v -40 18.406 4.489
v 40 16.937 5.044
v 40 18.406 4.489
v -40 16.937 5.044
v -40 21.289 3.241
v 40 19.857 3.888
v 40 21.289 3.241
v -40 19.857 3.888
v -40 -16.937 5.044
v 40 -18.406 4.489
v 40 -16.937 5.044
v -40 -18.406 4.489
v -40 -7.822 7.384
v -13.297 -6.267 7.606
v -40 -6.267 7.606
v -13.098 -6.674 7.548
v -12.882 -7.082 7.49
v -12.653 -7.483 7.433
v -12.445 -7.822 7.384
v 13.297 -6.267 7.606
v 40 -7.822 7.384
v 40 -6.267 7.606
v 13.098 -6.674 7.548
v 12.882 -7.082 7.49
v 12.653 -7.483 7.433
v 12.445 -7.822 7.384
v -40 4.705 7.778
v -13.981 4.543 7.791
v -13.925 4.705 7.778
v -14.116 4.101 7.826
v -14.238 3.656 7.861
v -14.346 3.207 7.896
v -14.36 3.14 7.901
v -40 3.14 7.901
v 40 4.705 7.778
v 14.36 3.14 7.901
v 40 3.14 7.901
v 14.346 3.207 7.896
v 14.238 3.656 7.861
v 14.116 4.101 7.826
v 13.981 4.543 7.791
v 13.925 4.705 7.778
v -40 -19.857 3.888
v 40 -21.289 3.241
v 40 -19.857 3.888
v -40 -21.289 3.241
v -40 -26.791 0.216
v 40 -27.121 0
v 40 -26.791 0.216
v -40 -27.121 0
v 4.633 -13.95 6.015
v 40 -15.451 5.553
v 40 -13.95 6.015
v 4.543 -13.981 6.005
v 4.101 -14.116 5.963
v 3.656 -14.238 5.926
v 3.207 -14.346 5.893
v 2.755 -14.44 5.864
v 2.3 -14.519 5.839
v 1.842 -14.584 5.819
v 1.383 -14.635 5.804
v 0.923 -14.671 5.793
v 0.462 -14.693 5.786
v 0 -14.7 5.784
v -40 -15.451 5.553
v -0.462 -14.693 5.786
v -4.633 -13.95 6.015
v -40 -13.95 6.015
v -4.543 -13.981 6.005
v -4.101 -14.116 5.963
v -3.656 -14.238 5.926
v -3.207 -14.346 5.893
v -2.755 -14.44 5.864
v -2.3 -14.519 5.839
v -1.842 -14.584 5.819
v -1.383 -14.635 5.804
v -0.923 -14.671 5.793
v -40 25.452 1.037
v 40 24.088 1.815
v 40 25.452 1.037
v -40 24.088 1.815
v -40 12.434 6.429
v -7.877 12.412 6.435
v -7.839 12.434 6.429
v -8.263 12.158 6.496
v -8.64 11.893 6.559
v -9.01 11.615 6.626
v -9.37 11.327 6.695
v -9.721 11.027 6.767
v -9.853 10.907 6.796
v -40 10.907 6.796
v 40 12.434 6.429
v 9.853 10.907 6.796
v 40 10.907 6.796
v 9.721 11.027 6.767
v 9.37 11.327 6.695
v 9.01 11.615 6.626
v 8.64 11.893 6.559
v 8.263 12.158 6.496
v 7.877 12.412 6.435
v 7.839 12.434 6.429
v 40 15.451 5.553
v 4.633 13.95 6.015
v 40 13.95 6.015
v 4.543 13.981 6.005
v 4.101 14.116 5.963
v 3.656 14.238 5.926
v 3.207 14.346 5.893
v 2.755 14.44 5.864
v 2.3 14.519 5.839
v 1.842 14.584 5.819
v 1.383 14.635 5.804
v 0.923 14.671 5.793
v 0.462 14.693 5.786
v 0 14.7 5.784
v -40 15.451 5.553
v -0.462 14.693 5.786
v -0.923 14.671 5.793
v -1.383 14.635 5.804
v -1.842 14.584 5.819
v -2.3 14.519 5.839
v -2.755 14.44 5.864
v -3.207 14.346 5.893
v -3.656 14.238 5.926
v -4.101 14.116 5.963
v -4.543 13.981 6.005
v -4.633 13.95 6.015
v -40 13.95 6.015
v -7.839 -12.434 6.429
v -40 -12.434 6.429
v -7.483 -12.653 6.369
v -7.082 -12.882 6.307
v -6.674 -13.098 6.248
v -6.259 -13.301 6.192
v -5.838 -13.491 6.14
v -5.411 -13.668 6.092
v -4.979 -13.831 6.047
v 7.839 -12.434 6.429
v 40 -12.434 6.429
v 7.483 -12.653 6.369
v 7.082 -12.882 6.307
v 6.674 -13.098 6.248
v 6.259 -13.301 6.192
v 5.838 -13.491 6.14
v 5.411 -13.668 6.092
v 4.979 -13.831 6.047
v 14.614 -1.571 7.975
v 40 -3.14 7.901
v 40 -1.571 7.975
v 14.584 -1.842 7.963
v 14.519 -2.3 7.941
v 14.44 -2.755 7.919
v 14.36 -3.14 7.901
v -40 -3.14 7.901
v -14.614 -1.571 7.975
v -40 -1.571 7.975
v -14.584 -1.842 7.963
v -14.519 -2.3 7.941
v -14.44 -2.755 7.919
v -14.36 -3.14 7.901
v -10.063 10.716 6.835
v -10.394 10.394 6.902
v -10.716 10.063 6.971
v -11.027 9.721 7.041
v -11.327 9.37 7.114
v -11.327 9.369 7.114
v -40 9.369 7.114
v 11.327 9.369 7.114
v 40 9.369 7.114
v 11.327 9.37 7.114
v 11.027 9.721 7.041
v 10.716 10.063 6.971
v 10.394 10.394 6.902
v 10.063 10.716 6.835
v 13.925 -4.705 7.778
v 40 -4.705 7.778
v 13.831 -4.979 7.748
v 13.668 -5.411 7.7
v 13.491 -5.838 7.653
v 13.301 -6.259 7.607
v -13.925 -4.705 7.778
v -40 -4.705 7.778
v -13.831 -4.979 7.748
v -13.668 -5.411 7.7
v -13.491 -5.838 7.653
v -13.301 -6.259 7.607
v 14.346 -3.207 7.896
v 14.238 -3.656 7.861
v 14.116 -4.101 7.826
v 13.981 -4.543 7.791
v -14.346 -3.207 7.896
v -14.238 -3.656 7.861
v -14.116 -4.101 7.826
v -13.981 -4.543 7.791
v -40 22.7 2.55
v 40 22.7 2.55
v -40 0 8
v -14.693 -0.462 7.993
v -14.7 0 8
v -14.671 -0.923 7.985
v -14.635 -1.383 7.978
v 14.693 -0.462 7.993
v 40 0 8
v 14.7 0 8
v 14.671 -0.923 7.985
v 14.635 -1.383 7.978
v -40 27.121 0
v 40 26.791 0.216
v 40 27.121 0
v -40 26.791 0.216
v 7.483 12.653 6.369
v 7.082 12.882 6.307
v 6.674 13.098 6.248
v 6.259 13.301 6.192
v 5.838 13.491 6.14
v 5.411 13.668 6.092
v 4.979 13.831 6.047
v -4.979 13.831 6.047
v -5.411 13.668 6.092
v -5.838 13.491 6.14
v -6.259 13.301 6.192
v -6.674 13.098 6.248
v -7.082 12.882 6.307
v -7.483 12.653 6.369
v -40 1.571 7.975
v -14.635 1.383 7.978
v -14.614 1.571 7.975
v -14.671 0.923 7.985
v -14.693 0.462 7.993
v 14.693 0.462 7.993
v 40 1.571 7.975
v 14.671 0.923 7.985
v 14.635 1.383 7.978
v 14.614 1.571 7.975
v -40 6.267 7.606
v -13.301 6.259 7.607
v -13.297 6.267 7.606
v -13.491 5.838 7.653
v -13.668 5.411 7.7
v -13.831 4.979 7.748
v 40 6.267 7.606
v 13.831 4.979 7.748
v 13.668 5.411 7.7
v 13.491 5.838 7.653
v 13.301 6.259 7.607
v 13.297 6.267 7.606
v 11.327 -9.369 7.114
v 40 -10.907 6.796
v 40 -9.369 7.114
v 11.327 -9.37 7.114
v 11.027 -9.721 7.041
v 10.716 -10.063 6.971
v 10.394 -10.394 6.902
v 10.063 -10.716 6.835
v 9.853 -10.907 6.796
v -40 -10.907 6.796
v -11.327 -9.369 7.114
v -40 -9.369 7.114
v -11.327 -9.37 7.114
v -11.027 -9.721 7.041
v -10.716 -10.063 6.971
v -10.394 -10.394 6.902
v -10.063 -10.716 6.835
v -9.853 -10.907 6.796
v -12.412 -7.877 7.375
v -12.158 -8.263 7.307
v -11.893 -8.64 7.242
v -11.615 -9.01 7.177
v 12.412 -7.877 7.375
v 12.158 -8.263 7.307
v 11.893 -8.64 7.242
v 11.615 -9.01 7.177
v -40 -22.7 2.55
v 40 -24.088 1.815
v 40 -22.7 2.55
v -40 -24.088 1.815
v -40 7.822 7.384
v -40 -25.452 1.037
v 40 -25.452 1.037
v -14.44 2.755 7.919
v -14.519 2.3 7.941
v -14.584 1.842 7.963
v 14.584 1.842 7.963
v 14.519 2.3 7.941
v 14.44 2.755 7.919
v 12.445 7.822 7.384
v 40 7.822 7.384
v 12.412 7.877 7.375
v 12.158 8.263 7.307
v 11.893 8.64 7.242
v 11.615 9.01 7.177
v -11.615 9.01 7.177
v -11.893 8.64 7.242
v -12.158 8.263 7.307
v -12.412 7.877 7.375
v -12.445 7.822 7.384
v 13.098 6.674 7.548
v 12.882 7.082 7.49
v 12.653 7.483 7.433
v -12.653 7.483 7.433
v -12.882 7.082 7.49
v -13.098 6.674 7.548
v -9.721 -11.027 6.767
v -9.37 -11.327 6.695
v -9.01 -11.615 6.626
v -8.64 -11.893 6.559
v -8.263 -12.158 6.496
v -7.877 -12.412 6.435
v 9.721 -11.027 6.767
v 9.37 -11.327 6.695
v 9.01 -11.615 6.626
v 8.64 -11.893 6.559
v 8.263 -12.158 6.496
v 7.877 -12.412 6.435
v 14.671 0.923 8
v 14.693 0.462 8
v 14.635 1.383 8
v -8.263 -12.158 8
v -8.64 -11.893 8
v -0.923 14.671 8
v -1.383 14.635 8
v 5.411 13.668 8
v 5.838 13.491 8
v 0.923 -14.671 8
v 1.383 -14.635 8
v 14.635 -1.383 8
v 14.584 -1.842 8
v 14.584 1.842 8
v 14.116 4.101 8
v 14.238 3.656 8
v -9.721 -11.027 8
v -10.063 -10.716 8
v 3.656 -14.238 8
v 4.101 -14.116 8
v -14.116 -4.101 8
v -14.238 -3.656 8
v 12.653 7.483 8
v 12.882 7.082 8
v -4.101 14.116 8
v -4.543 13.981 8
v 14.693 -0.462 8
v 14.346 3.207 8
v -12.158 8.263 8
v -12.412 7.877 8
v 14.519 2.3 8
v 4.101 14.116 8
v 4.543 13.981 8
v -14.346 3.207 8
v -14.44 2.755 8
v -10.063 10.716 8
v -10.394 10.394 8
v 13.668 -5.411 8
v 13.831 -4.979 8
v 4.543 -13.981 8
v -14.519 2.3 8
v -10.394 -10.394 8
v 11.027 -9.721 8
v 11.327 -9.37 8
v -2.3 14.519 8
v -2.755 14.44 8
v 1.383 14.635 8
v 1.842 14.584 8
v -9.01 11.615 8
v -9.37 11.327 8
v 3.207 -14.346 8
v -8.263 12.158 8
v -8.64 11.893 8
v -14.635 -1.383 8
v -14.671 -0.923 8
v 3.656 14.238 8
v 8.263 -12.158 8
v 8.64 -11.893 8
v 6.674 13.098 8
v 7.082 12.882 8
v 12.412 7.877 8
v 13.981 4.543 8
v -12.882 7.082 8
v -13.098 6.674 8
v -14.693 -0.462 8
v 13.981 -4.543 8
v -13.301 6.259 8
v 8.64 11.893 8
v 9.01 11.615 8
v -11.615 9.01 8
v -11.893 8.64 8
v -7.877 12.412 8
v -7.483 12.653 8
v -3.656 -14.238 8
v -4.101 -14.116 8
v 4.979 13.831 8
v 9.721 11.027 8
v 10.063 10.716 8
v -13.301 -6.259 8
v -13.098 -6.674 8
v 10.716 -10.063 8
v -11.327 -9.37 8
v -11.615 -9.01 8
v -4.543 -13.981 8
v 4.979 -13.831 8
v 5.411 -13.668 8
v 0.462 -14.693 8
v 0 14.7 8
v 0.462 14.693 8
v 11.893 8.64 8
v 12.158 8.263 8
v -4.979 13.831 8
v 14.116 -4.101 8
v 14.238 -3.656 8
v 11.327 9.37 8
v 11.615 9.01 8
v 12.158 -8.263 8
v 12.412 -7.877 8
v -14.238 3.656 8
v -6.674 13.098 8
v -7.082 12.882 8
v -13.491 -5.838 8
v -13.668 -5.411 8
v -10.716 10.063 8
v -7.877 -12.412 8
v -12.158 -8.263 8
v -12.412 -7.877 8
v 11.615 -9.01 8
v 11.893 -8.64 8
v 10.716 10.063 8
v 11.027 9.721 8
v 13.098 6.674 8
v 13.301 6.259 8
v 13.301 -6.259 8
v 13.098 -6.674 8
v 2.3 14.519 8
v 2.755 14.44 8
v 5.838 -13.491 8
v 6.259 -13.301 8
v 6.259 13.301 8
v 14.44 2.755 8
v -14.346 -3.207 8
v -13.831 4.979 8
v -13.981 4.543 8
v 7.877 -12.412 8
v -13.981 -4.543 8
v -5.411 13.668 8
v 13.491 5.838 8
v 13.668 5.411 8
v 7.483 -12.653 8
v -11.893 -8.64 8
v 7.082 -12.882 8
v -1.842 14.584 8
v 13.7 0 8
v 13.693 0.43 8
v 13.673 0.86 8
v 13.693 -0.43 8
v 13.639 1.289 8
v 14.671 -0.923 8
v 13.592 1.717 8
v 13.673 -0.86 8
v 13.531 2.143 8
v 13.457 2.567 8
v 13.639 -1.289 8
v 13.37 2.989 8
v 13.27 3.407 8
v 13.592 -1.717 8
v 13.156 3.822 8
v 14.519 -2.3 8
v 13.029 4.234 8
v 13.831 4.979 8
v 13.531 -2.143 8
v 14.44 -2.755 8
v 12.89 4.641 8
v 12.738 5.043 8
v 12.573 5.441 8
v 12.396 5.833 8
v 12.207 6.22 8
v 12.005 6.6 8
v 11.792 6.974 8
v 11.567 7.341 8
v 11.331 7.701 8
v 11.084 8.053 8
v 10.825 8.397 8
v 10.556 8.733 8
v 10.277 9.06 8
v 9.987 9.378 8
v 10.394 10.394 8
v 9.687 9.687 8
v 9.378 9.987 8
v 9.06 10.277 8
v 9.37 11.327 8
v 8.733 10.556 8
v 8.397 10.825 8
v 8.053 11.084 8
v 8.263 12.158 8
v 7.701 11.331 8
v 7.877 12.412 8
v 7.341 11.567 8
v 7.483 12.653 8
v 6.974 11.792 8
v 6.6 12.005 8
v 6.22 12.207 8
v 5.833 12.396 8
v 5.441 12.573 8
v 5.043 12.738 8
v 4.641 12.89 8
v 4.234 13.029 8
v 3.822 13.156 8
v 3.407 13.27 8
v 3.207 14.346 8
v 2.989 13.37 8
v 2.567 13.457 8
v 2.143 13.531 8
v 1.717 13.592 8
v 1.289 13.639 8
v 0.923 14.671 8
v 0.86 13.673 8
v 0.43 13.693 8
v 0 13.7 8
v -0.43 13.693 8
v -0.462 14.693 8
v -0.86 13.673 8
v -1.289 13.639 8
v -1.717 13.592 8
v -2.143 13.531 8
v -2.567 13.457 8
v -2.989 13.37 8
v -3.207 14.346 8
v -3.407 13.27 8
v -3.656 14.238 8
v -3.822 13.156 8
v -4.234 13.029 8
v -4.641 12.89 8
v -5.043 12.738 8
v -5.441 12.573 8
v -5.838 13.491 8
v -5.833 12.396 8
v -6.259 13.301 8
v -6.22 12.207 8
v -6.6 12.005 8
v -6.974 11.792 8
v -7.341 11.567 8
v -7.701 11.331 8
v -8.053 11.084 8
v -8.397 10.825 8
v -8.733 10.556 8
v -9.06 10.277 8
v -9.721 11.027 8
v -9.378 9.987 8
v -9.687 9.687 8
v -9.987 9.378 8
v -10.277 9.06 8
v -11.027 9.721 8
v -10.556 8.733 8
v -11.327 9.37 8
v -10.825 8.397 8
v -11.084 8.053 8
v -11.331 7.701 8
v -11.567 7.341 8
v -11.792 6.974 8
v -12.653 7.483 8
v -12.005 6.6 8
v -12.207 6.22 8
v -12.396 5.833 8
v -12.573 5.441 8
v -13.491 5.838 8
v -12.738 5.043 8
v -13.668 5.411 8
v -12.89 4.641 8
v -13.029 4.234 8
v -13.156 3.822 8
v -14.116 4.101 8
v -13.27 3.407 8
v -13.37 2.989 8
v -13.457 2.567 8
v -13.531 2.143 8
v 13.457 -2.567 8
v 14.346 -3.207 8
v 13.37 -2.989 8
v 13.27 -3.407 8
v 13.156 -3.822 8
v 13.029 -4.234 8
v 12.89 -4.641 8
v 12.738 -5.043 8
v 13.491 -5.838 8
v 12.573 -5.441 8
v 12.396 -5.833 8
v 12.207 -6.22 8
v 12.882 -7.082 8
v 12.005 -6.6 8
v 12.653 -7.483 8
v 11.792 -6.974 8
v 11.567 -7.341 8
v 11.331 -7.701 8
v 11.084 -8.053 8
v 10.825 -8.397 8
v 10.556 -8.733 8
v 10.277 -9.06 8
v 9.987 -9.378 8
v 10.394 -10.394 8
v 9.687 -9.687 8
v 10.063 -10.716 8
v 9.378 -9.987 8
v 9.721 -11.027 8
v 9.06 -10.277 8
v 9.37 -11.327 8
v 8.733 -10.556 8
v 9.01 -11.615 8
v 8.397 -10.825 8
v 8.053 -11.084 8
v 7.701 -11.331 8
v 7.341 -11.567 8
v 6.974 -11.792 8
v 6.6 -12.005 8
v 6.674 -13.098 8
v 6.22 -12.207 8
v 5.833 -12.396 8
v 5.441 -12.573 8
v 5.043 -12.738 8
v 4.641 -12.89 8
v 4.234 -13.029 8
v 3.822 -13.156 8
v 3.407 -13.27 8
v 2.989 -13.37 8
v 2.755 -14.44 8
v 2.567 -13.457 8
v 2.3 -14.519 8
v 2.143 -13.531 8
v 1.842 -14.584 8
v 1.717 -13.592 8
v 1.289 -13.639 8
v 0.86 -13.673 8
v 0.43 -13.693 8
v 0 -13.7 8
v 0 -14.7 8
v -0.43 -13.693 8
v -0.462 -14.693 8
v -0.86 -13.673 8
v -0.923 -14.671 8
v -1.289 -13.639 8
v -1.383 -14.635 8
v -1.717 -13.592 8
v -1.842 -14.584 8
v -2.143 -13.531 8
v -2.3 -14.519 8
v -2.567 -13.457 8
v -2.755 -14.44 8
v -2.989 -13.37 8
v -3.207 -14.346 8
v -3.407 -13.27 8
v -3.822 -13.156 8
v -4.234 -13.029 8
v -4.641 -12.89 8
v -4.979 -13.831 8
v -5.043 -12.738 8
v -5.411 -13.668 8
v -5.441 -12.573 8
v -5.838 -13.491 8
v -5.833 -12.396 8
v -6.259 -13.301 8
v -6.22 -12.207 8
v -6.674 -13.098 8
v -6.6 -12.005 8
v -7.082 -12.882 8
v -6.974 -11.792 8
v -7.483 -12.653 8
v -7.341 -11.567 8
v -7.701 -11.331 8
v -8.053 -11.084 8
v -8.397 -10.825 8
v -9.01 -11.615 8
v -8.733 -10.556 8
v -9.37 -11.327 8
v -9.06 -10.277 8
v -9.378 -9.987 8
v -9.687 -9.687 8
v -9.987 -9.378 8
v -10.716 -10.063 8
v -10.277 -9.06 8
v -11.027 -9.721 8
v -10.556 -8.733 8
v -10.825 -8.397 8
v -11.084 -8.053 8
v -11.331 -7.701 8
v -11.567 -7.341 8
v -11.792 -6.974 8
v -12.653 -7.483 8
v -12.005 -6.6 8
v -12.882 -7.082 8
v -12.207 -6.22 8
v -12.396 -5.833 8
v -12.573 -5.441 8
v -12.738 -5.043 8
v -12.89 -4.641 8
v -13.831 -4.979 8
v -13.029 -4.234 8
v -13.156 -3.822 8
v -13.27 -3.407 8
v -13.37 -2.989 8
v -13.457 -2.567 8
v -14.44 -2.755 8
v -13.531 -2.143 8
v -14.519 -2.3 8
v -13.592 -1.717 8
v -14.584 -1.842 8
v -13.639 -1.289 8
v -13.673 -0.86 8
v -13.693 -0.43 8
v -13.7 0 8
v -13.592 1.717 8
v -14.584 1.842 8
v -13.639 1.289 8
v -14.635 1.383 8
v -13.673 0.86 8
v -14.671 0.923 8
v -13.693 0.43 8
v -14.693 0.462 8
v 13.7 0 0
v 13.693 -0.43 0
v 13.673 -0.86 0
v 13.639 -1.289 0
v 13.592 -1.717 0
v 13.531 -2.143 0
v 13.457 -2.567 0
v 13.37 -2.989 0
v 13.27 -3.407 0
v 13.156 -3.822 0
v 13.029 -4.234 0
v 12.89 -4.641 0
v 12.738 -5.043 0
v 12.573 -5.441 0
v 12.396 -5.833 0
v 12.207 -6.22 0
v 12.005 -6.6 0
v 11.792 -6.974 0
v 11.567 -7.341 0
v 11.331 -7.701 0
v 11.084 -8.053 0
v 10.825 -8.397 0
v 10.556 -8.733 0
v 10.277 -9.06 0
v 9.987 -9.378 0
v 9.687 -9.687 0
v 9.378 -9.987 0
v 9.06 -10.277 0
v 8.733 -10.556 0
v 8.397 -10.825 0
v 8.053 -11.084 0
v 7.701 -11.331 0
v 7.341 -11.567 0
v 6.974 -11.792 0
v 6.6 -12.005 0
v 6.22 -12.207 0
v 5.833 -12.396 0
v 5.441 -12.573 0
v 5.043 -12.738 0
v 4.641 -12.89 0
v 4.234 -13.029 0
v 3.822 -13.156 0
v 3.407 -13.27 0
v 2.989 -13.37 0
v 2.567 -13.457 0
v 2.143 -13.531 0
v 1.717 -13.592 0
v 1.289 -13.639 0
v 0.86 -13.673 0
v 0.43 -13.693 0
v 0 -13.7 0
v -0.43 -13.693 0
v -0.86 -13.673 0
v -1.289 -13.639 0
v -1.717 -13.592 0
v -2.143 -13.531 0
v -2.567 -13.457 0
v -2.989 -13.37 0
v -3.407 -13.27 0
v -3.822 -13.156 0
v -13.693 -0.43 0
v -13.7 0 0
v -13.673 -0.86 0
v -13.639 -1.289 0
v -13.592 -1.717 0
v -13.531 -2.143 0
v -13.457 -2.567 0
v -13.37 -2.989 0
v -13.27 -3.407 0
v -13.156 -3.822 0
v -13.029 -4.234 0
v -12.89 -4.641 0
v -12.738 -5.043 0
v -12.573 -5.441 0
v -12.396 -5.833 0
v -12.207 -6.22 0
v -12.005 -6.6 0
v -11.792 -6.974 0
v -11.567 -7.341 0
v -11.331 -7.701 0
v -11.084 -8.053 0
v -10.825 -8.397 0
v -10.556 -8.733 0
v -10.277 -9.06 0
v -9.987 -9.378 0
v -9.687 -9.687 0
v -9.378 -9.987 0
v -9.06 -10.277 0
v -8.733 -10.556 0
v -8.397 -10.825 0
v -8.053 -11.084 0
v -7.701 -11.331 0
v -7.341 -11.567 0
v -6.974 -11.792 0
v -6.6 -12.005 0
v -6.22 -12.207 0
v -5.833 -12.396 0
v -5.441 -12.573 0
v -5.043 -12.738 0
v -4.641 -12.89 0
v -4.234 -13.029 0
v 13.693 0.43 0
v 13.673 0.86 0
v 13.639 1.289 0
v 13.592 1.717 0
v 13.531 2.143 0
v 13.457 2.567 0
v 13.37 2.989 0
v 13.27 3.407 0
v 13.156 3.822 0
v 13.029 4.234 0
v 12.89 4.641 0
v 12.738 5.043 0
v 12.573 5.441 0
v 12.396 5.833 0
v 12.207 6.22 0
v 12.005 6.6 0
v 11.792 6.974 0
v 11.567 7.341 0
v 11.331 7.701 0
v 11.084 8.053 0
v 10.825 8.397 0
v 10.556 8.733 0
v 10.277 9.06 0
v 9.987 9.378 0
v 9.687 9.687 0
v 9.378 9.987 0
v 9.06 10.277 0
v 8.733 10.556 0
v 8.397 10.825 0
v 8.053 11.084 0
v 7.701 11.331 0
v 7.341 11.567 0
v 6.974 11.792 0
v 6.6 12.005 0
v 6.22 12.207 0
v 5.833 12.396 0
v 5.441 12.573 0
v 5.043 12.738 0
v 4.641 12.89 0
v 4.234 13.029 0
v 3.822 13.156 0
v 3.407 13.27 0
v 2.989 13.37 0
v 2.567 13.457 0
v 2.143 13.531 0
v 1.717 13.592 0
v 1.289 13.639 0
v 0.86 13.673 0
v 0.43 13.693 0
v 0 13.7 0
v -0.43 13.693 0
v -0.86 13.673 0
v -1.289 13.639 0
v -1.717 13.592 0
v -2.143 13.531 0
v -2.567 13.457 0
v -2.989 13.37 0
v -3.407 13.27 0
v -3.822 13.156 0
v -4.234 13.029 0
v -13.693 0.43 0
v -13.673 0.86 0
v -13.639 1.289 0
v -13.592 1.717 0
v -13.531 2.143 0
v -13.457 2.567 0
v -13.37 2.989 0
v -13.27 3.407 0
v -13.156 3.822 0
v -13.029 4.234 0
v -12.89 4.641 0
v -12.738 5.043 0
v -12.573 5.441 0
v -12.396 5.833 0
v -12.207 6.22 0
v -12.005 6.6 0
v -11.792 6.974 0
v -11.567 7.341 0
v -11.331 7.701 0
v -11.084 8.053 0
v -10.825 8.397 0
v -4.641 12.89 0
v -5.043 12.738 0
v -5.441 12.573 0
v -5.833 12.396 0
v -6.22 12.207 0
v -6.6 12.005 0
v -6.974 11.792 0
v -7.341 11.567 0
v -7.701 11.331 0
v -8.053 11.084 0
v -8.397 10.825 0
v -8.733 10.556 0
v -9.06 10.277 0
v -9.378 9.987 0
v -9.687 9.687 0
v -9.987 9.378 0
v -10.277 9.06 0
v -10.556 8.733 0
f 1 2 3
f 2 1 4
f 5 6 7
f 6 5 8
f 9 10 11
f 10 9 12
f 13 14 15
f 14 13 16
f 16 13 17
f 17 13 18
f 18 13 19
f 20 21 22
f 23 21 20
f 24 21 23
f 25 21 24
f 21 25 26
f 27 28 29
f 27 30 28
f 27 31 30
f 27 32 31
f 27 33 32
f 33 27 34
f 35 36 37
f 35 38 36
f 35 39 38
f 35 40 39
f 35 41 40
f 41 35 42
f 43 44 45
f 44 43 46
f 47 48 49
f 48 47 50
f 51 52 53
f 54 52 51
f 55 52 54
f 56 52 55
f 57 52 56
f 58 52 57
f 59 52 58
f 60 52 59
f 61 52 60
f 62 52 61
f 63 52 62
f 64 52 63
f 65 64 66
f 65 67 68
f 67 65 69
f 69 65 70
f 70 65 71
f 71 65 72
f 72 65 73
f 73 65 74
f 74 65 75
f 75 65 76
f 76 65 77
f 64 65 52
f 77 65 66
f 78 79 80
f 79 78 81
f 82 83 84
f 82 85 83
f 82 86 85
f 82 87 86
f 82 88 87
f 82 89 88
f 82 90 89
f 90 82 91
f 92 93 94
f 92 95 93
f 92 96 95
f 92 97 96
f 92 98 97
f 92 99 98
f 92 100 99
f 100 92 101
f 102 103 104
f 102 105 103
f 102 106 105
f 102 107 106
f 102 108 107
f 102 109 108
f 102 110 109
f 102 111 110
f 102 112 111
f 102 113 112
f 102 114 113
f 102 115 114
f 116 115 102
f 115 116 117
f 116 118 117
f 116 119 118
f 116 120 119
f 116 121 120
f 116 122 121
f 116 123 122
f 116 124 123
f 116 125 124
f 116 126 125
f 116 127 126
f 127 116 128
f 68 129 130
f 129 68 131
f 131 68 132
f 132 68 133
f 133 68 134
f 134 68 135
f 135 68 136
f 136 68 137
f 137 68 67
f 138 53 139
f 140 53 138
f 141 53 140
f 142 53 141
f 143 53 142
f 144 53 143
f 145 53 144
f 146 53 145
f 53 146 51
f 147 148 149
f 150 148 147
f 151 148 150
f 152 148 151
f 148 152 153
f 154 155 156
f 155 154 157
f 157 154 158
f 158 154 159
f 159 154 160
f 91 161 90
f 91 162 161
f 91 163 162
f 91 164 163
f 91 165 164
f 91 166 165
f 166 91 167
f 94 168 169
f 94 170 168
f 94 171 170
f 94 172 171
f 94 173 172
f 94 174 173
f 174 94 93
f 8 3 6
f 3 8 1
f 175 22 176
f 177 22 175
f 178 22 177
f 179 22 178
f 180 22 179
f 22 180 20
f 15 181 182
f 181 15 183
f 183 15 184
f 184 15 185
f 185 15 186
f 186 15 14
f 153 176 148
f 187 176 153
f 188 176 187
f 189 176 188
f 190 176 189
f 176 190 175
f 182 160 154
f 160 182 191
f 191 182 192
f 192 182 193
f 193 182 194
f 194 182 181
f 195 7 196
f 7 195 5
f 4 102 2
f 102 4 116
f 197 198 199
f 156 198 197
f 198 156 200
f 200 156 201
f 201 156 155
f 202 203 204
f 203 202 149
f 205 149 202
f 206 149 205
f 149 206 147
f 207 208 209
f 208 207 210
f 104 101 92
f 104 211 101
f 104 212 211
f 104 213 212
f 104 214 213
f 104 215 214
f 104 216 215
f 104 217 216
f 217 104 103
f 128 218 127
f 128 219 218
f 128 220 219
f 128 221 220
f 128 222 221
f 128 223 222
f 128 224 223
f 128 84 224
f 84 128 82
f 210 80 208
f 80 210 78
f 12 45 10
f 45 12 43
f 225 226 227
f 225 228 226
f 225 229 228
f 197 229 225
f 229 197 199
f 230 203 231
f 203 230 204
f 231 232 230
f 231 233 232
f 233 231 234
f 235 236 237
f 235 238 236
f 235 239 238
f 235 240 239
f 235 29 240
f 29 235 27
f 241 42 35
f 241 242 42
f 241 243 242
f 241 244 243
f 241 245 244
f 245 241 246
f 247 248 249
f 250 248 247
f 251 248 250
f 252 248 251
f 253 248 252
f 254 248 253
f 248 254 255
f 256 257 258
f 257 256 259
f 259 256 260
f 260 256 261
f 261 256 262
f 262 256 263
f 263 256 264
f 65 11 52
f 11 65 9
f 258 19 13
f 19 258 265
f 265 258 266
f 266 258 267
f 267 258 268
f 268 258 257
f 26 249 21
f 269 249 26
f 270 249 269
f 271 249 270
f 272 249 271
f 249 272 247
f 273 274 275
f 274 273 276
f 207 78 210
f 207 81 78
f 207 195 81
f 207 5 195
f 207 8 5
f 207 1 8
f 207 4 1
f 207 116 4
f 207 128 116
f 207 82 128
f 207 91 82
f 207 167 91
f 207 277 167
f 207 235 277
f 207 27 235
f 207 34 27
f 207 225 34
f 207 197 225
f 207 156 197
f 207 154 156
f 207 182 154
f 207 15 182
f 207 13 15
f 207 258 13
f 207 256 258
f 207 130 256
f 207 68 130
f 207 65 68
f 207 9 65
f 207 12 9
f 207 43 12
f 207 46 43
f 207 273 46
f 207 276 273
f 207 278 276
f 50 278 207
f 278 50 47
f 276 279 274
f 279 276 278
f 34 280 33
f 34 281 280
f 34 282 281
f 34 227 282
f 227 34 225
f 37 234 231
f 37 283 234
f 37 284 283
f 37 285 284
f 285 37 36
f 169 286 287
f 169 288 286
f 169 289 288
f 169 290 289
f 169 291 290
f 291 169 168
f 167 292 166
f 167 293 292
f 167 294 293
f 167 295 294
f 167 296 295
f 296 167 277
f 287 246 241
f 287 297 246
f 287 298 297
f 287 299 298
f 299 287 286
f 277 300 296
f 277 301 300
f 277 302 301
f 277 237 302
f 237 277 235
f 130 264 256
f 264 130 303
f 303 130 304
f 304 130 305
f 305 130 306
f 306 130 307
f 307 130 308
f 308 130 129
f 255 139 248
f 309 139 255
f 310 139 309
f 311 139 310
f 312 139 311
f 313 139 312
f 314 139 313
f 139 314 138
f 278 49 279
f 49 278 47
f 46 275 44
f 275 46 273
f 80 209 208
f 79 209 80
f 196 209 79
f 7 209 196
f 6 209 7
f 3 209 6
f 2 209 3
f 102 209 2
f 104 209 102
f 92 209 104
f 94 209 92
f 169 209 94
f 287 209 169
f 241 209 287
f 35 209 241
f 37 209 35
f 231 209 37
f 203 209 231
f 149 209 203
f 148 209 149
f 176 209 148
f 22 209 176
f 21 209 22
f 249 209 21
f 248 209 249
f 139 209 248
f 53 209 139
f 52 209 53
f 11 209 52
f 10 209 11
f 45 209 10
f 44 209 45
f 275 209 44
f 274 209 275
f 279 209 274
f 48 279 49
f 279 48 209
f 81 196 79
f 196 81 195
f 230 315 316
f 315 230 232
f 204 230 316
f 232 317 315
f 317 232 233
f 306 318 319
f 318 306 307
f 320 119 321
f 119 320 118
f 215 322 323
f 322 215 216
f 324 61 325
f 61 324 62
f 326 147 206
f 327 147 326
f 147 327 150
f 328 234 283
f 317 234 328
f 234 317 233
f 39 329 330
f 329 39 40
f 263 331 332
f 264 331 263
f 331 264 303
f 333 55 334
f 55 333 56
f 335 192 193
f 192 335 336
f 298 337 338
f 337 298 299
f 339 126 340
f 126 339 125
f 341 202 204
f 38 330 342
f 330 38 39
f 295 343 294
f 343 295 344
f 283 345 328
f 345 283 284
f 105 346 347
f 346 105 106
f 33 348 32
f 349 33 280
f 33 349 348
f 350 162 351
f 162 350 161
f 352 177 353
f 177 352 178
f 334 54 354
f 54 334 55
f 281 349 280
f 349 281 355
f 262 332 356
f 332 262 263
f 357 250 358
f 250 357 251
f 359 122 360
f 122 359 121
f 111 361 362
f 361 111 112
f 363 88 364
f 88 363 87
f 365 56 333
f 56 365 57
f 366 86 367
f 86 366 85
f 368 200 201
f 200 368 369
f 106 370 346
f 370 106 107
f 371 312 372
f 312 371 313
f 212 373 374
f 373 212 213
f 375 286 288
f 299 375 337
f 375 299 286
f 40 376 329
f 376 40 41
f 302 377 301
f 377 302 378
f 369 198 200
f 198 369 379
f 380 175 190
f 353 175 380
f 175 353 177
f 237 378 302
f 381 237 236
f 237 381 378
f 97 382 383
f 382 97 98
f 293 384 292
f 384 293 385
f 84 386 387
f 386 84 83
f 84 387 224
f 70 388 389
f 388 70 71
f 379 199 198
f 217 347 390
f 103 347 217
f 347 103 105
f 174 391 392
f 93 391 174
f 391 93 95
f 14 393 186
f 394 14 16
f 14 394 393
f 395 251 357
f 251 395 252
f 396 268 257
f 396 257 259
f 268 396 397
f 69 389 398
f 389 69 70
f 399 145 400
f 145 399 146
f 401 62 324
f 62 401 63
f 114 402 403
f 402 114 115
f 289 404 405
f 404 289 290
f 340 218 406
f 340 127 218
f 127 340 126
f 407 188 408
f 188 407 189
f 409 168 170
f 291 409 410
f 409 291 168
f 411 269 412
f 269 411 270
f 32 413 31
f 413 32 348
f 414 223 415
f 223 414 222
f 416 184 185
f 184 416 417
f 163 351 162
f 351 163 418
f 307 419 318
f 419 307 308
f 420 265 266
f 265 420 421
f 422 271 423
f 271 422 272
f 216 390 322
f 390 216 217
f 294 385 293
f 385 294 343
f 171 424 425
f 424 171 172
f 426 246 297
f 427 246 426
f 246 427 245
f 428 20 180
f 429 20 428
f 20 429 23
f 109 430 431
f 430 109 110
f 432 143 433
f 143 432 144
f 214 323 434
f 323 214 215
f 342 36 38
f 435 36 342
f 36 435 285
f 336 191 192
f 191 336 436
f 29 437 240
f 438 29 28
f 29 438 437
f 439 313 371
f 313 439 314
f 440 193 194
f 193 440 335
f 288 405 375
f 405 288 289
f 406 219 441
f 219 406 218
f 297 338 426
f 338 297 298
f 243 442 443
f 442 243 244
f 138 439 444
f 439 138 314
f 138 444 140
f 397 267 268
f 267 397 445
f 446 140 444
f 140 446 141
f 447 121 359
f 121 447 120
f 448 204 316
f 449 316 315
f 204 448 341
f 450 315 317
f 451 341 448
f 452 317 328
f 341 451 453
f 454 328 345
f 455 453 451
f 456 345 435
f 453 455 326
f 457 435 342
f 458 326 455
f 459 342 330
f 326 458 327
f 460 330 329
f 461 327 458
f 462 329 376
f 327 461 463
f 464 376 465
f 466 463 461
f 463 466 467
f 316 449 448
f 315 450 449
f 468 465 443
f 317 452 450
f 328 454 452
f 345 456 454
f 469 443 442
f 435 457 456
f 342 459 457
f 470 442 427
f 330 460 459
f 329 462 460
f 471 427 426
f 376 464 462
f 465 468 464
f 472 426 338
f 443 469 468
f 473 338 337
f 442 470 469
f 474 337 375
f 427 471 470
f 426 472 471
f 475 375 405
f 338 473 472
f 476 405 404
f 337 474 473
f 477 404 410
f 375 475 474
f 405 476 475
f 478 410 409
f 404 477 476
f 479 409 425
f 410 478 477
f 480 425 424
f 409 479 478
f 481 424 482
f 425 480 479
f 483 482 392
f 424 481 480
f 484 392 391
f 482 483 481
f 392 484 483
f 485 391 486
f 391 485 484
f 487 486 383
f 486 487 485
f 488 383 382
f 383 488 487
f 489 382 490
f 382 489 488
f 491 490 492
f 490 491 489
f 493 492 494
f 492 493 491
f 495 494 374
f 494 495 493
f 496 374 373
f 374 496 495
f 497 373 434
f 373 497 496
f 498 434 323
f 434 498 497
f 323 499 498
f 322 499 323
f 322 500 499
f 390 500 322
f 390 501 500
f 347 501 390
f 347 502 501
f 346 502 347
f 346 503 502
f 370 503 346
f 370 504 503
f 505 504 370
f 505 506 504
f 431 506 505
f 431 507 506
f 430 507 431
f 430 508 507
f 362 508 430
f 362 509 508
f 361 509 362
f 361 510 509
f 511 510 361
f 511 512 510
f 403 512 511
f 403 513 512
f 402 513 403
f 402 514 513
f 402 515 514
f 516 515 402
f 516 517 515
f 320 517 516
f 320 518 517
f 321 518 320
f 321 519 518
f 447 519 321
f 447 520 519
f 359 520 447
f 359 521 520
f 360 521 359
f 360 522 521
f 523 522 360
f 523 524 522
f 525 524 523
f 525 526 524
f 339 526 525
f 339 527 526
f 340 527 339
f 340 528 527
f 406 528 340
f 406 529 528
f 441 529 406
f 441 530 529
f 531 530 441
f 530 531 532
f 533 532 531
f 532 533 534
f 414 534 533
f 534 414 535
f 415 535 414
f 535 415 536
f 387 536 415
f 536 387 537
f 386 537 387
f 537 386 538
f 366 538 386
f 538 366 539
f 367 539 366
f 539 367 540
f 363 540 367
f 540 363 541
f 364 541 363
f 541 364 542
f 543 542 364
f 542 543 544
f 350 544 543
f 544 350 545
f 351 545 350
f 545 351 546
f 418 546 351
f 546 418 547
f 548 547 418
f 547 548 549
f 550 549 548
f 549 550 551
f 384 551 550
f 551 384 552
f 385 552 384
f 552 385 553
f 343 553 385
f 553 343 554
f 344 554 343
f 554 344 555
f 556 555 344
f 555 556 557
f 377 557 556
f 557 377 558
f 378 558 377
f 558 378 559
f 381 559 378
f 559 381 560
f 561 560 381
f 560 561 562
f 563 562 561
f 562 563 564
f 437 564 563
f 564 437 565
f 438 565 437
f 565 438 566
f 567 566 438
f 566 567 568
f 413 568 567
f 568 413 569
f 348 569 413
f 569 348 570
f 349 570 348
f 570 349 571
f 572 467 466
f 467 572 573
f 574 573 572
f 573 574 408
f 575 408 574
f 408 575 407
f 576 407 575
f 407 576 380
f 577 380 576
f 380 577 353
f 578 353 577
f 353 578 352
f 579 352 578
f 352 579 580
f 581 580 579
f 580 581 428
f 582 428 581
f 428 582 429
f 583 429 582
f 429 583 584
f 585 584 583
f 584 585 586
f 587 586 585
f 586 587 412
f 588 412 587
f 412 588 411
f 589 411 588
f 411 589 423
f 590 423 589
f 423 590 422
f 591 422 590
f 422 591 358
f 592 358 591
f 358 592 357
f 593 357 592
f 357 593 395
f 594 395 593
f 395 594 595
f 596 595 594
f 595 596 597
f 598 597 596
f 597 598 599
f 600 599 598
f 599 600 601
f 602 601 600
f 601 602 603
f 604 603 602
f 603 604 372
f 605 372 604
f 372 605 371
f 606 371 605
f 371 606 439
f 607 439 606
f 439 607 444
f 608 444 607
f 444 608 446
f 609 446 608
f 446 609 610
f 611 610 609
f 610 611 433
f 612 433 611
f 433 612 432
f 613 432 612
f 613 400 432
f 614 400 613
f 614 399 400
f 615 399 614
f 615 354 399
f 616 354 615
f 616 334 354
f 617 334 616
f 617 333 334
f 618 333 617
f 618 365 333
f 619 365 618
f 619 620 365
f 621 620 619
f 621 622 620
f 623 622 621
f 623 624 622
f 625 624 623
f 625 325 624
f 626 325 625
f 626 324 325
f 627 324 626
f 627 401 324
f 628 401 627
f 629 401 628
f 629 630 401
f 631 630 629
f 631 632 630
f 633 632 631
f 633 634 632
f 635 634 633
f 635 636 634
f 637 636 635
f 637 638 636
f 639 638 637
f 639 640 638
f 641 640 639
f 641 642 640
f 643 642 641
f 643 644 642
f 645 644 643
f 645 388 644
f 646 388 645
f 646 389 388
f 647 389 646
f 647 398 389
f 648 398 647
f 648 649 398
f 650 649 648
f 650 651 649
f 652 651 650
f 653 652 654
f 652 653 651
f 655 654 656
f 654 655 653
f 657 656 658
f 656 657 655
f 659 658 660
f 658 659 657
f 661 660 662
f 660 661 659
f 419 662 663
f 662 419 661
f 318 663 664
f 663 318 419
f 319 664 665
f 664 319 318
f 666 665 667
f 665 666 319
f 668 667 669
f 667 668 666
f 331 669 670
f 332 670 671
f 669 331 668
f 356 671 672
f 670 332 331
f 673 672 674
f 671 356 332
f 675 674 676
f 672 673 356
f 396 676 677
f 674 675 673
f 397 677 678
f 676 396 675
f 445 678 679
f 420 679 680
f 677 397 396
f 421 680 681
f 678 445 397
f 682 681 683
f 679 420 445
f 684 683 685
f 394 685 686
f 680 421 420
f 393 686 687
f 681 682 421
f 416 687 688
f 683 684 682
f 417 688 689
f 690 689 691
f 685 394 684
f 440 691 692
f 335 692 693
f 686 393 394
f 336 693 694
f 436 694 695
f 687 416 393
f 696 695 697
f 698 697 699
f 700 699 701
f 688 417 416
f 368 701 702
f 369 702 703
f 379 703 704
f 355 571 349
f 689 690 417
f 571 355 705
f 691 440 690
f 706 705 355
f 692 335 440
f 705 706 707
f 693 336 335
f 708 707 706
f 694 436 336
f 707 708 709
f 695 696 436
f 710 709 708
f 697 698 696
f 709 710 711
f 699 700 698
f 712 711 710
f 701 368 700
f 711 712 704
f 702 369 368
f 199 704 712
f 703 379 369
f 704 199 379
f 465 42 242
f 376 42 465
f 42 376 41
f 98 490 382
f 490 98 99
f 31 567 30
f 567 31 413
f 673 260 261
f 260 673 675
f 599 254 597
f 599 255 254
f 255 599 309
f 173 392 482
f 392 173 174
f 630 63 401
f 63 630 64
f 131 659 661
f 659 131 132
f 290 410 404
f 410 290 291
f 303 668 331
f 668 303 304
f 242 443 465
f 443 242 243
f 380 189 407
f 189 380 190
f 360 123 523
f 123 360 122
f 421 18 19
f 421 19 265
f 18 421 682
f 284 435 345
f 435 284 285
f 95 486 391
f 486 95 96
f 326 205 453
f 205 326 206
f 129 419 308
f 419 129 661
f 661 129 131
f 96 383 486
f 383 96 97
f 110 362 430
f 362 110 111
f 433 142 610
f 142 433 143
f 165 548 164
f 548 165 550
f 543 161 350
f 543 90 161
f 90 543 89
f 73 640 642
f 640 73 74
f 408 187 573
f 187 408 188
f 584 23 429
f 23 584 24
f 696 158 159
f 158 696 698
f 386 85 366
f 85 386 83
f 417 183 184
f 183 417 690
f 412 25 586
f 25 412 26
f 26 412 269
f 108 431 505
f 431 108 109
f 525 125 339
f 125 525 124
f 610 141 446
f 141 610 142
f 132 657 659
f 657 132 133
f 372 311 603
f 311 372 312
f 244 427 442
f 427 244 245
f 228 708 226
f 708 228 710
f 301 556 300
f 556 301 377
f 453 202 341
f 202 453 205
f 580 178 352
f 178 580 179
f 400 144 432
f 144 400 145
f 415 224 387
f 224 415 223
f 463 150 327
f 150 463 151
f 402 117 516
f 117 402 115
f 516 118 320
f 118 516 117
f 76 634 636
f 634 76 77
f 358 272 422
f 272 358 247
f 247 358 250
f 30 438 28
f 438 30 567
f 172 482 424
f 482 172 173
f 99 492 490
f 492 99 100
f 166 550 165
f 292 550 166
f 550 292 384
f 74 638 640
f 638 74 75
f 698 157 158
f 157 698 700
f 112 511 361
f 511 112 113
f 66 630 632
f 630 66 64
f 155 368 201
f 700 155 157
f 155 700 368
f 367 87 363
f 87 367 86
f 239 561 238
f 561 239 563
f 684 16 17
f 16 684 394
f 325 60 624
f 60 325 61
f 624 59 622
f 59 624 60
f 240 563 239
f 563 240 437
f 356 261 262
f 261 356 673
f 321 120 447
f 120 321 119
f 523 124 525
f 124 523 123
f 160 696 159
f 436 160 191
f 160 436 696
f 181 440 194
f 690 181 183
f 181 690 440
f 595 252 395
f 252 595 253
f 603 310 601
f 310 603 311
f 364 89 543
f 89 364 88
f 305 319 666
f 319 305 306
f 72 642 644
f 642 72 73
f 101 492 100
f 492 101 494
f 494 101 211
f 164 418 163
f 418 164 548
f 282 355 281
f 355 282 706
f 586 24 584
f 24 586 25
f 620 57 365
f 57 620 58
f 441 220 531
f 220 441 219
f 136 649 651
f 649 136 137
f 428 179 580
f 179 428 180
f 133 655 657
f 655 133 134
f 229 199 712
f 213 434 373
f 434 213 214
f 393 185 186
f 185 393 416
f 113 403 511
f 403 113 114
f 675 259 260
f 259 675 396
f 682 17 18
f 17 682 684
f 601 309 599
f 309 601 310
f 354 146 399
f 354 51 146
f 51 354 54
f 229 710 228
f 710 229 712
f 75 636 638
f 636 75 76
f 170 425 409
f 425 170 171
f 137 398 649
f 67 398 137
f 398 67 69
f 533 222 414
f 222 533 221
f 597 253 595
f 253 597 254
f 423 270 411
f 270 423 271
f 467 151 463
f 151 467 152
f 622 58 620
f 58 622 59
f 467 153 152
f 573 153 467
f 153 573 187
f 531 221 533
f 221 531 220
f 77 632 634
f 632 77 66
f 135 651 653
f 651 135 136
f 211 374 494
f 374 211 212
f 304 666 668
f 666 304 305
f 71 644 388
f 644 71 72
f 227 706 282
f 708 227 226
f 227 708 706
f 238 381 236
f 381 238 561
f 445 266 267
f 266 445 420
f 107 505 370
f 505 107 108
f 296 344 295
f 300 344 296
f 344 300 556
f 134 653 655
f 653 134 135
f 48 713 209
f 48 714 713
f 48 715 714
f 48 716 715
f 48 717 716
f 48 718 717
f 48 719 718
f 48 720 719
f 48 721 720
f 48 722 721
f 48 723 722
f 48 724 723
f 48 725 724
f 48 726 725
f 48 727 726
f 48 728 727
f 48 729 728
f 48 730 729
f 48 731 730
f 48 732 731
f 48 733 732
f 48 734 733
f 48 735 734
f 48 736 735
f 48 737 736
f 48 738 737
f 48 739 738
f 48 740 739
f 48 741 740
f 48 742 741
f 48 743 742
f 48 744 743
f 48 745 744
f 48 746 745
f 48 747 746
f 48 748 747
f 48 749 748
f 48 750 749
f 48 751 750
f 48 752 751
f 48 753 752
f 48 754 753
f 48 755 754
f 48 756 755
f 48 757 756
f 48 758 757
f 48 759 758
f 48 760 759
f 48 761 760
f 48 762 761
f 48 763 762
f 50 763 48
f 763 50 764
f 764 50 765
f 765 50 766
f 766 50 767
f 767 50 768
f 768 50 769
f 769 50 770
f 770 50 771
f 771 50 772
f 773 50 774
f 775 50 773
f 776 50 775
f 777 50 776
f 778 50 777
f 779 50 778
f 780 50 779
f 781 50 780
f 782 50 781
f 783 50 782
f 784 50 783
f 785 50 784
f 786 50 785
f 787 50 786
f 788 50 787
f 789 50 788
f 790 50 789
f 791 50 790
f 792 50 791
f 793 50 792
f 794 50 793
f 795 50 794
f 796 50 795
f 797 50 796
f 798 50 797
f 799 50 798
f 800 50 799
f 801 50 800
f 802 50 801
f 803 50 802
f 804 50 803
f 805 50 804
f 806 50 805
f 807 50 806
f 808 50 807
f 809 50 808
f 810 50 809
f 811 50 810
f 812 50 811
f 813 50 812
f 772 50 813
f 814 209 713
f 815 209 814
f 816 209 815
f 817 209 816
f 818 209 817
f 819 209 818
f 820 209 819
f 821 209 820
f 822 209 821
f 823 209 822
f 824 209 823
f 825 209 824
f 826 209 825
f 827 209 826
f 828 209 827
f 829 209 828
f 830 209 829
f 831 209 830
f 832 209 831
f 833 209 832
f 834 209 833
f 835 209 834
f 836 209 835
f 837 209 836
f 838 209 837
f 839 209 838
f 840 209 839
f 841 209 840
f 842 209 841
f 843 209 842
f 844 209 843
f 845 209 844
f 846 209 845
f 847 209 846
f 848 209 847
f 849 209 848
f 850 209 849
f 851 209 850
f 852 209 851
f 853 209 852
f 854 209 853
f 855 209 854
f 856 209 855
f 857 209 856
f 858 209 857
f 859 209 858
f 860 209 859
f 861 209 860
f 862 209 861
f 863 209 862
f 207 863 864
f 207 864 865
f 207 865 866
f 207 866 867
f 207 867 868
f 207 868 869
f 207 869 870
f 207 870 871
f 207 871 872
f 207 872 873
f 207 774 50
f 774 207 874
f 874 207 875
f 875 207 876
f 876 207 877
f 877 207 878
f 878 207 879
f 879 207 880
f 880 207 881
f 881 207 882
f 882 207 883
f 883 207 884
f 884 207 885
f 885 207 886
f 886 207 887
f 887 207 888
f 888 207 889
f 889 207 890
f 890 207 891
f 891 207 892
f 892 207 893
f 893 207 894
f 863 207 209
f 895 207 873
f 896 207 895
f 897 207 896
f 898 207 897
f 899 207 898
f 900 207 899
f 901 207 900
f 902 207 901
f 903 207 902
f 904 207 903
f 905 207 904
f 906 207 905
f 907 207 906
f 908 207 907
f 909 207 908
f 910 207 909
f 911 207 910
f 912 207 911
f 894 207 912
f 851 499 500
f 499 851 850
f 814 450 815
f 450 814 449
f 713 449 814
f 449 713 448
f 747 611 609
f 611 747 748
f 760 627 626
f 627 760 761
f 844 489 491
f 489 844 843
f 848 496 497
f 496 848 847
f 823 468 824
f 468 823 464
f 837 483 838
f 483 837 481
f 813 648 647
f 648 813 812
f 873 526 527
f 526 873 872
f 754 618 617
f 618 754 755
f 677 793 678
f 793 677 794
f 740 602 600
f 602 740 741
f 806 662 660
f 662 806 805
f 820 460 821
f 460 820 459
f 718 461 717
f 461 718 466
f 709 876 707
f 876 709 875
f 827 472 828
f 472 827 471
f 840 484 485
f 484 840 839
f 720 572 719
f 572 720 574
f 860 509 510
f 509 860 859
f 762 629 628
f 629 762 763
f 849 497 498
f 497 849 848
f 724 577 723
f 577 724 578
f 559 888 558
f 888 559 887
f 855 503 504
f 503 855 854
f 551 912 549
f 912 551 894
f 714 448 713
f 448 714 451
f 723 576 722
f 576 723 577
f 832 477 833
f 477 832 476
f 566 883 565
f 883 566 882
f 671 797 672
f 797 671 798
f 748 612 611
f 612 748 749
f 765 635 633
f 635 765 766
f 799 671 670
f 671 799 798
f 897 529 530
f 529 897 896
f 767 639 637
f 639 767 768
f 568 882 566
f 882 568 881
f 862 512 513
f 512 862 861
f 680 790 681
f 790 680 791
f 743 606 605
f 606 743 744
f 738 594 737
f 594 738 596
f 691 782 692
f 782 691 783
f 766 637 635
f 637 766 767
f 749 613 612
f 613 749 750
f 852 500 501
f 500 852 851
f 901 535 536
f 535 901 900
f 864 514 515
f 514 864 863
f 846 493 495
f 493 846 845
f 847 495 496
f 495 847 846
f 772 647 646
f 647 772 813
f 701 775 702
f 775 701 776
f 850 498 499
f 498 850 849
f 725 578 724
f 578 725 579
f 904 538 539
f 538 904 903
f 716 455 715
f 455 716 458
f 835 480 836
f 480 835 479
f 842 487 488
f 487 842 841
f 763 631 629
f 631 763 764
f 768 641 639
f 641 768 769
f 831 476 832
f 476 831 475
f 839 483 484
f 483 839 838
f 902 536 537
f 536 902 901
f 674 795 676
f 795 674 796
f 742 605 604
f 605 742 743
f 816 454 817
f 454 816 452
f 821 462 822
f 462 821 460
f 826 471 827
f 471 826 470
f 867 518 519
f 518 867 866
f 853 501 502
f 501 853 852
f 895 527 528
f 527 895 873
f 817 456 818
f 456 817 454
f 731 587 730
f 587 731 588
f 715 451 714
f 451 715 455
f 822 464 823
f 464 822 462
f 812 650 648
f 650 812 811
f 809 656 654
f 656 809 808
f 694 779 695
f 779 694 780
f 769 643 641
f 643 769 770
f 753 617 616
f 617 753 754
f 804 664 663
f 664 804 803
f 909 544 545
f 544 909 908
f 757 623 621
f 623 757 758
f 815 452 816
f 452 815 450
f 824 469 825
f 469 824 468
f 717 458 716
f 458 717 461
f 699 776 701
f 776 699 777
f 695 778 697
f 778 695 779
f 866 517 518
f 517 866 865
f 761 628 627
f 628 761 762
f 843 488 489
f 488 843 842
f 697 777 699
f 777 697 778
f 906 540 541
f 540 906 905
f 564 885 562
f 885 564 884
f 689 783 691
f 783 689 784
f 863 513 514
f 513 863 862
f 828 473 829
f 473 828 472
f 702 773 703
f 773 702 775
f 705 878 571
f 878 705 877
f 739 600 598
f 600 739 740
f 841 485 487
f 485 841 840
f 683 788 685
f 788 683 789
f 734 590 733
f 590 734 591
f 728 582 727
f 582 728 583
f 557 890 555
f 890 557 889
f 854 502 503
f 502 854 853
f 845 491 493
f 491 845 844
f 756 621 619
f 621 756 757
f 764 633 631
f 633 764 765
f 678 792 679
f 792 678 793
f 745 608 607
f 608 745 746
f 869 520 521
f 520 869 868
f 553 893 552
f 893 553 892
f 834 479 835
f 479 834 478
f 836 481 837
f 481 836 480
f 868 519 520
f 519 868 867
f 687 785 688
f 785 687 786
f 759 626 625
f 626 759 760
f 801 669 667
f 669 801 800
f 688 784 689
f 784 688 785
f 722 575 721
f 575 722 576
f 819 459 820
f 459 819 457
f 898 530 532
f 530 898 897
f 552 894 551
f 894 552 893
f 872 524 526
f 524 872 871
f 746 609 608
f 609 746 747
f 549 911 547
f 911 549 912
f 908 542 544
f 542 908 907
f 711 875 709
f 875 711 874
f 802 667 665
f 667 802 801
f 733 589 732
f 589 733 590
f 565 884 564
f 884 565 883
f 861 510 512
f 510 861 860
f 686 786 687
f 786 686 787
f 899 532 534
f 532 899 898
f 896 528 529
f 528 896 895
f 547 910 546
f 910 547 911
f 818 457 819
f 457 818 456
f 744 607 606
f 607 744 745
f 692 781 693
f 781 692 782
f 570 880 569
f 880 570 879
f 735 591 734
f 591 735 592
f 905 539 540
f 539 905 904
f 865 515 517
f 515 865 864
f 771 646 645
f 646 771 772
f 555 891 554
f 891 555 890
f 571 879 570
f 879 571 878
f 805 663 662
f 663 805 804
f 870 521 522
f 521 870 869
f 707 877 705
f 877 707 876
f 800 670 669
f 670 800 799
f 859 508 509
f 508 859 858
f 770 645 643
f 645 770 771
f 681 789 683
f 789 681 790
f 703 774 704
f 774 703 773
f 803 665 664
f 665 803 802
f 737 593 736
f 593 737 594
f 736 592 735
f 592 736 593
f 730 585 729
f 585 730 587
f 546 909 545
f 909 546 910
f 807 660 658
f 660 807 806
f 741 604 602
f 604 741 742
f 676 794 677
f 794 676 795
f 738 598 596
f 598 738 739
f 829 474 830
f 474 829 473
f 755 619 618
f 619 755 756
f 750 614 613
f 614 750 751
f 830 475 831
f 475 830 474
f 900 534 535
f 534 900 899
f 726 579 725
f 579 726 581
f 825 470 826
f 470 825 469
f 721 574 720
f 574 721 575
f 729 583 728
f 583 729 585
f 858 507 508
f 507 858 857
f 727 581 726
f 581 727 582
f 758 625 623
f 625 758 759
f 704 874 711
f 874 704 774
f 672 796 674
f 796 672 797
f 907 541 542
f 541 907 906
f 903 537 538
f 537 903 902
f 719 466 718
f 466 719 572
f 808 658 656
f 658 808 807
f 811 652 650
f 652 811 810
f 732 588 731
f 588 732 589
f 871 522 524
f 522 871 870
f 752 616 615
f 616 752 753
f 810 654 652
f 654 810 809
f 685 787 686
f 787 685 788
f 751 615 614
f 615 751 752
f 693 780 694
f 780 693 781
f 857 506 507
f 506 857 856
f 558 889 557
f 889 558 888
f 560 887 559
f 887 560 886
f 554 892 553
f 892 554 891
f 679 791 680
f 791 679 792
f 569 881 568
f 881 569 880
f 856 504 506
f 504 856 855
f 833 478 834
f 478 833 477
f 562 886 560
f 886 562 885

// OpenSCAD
// whole part curve (diameter)
d = 100; // [50:200]
// height of the part
h = 8;
// thickness of the tube
thickness = 1;
// tolerence space between the tube and blade
tolerence = 2;

// resolution
$fn = 200;

/* [Animation] */
// rotating animation
animation_rotation = false;

/* [Hidden] */
is_animated = animation_rotation;
$vpt = is_animated?[0, 0, 0]:$vpt;
$vpr = is_animated?[60, 0, animation_rotation?(365 * $t):45]:$vpr;  // animation rotate around the object
$vpd = is_animated?200:$vpd;

saberSupport();

module saberSupport() {
    INCH = 25.4;
    hole = INCH + tolerence;
    difference() {
        union() {
            color("Silver")
                translate([0, 0, -d / 2 + h])
                    rotate([0, 90, 0])
                        cylinder(d = d, h = 80, center = true);
            color("Gray")
                cylinder(d = hole + thickness * 2, h = h);
        }
        translate([0, 0, -d / 2])
            cube(d, center = true);
        cylinder(d = hole, h = 80, center = true);
    }
}
